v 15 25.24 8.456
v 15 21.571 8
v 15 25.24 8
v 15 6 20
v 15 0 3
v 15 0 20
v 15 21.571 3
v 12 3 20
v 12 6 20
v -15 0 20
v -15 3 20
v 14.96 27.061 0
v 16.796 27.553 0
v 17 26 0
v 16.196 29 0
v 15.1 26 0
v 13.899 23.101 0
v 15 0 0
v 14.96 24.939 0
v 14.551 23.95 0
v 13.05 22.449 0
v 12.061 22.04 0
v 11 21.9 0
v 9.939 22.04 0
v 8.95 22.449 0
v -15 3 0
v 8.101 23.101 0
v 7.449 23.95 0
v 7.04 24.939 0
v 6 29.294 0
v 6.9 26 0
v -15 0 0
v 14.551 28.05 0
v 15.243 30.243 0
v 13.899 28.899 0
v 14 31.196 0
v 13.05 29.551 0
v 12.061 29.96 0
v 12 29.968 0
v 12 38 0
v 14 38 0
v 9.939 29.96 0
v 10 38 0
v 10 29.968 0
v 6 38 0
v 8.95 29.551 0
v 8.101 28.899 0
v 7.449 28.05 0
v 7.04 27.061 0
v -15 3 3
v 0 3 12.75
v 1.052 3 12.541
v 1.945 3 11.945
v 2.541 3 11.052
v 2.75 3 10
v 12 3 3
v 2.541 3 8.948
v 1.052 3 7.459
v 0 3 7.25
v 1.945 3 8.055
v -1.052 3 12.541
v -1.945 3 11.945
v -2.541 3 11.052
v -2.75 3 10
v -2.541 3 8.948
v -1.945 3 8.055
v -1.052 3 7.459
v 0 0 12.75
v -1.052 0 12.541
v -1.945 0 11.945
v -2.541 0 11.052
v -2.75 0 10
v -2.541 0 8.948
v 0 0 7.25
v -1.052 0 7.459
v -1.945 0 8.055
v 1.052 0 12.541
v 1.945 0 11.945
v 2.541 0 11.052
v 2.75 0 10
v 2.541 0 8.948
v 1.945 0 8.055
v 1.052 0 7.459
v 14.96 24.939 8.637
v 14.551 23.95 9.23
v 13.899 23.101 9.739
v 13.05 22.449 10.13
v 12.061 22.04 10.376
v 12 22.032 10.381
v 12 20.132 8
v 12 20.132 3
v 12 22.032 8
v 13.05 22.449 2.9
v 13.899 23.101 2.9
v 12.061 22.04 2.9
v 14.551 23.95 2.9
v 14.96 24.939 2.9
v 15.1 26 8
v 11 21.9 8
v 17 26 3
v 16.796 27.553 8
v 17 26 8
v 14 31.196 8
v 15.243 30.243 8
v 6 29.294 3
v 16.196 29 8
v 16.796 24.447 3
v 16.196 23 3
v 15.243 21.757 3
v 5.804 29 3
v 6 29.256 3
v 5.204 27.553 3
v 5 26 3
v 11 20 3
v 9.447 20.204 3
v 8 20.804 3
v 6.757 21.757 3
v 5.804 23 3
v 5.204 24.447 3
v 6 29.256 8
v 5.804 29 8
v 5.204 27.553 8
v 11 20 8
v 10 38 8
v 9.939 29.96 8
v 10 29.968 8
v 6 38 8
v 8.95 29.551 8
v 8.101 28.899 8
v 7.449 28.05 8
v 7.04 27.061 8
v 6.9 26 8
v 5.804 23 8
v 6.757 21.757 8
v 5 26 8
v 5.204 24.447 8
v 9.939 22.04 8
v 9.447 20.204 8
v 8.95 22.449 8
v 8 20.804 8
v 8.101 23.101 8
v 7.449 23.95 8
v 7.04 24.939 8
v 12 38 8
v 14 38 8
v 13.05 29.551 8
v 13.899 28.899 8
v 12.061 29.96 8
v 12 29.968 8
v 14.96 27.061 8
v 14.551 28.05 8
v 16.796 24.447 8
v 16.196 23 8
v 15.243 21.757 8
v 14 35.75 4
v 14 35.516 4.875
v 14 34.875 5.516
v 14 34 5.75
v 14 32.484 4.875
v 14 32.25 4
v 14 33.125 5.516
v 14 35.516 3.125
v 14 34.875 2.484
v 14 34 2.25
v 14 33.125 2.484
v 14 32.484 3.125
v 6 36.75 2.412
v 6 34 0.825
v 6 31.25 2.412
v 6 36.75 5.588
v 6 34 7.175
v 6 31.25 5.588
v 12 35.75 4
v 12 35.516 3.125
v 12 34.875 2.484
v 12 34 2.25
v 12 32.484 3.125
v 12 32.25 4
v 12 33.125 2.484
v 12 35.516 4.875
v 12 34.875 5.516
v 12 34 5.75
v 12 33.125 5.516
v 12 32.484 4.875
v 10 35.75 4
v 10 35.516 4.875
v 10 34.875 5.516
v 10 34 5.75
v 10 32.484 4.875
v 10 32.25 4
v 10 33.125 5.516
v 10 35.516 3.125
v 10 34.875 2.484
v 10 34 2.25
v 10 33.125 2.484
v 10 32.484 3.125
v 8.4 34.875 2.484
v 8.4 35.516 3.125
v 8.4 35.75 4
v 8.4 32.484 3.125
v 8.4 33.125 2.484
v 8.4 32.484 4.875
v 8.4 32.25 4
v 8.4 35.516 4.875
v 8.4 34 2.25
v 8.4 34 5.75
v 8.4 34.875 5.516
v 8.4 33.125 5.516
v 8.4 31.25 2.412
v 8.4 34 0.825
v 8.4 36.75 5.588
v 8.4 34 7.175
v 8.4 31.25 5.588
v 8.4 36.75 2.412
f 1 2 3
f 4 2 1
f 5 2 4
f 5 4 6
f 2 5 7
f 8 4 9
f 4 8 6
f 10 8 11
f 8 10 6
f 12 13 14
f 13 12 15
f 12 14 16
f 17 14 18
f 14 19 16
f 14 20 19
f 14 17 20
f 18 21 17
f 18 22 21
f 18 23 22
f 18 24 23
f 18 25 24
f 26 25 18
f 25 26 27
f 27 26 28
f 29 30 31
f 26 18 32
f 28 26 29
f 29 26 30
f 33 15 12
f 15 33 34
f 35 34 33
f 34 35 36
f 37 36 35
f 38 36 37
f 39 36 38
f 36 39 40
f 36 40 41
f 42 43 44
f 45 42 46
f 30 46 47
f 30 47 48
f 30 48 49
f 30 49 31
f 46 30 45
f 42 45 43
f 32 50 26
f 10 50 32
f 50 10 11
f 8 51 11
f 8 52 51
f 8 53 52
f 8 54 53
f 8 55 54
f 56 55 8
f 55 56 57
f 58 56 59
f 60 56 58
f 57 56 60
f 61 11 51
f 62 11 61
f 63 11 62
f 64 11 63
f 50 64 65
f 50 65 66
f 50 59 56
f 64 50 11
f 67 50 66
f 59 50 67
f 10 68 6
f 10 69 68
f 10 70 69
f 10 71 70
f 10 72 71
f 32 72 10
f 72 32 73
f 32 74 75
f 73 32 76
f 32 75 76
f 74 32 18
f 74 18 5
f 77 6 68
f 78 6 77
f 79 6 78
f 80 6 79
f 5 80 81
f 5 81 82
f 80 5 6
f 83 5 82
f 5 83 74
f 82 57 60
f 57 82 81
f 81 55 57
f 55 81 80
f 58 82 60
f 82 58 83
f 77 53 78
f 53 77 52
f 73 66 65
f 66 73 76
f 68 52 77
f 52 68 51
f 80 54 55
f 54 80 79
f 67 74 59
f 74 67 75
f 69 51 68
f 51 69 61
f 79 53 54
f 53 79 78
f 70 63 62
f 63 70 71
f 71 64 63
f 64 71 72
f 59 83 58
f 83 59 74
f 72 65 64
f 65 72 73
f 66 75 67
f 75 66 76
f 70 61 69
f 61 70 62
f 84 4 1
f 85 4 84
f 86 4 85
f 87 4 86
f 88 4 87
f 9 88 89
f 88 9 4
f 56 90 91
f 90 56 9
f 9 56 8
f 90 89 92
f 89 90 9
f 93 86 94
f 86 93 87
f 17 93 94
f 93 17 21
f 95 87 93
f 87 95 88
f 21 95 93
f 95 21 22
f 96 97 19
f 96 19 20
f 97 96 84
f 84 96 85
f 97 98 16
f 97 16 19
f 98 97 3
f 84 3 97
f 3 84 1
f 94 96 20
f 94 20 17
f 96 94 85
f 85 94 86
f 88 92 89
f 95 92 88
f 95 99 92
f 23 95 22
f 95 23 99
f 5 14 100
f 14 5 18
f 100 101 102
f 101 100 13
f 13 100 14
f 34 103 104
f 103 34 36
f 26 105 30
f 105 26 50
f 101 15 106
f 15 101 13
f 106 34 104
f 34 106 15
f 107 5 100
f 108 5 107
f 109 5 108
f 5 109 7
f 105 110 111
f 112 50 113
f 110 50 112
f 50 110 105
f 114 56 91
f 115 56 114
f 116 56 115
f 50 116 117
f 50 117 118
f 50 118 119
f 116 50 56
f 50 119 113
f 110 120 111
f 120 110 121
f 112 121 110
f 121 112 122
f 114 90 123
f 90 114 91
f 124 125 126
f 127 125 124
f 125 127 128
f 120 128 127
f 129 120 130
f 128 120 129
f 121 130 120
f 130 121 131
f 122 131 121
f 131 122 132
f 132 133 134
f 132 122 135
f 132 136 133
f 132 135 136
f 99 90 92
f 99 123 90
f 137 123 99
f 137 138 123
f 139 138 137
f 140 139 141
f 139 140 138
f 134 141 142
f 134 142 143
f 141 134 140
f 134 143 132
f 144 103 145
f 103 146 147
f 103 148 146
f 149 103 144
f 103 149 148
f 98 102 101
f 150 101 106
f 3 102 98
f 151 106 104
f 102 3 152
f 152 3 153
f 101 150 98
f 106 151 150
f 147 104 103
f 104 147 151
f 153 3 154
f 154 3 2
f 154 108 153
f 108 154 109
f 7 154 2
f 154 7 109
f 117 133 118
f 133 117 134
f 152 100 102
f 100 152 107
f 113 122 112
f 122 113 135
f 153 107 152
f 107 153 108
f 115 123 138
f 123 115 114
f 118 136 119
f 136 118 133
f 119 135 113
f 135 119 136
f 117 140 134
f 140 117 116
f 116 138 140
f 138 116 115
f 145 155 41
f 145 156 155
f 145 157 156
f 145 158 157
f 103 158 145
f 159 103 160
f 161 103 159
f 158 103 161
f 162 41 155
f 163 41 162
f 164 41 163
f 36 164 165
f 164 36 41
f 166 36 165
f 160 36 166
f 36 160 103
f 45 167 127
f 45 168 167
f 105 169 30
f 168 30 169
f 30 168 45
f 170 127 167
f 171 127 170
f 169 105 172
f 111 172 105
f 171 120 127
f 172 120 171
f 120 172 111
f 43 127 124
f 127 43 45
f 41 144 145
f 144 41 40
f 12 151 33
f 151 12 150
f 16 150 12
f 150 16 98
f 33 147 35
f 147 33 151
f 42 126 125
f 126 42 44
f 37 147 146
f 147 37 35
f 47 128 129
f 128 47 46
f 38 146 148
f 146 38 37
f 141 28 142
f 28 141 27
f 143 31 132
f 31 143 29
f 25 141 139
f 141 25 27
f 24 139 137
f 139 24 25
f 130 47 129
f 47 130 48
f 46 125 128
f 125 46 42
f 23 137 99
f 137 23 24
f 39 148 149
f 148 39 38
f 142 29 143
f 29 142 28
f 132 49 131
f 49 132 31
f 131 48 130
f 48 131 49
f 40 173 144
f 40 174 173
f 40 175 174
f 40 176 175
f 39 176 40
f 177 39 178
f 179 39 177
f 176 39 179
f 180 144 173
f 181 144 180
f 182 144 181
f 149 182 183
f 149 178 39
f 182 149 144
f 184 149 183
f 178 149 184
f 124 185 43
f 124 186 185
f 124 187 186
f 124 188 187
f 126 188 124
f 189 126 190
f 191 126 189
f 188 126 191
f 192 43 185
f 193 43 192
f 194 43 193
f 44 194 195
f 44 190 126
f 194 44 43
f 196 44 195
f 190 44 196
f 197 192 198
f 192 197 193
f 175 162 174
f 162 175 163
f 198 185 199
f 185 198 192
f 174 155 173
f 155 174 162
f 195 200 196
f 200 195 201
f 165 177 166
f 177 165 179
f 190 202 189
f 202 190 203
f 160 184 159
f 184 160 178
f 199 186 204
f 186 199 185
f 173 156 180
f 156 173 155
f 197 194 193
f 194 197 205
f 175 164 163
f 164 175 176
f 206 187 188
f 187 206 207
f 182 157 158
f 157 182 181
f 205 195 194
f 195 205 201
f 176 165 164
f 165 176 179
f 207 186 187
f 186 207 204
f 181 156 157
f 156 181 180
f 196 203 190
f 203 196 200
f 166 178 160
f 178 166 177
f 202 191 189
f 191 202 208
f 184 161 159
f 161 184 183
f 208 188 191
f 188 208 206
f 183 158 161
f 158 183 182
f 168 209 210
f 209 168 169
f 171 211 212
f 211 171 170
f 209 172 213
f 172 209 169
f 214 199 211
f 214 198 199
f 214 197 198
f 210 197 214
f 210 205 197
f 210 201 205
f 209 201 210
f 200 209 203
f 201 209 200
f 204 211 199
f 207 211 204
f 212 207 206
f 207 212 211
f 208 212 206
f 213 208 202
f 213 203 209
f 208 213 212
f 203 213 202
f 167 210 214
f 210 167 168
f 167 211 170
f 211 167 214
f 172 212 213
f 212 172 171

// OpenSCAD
// file: modules.scad
// Fonctions personnalisées

//http://forum.openscad.org/Wish-mirror-copy-true-td10681.html
module copy_mirror(vec=[0,1,0])
{
    children();
    mirror(vec) children();
}

module ecrou(plat,h){
  cylinder(d=plat*2/sqrt(3), h=h, $fn=6);
}


module courroie(diam,longueur){
  color ("black")
  difference(){
    hull(){
      cylinder(d=diam+1, h=6, $fn=32);
      translate([longueur,0,0]) cylinder(d=diam+1, h=6, $fn=32);
    }
    translate([0,0,-1])
    hull(){
      cylinder(d=diam-1, h=8, $fn=32);
      translate([longueur,0,0]) cylinder(d=diam-1, h=8, $fn=32);
    }
  }
  
  
}
// file: config.scad
// Paramètres de la machine

decal=-30;            // décallage du chassis xz
hauteur=400;          // hauteur totale chassis
largeur=350;          // largeur totale chassis
longueur=500;         // longueur totale chassis
hauteur_base=90;      // hauteur de la base
entraxe_y=140;        // distance entre les tiges Ø8 axe Y

couleur=[1,0.6,0];



// Paramètre des pièces et jeux

// écart plateau/courroie
// y_belt_holder
belt_h=13;      // écart entre la courroie et le plateau

// écart plateau/tiges lisses
// y_lm8uu
decal_plateau=12; // Décallage en Y

// décallage des tiges lisses Y
// support_tige8_y
decal_tiges=5;

// décallage moteur Y
// y_motor
decal_motory_z=11;
decal_motory_y=25;

// Fixations axe Z
pos_z=26;
hauteur_z=20;
entraxe_z=17;

// Plats écrous
ec3=5.7;
ec4=7.2;
ec5=8.2;
ec6=10.2;

// Jeu sur plats pour les écrous glissants
jec=0.2;

// hauteur écrous
ec3h=2.4;
ec4h=3.2;
ec5h=4.7;
ec6h=5.2;

// Vis
vis3=3.5;
vis4=4.5;
vis5=5.5;
vis6=6.5;

// nombre de dents des poulies
poulie=20;
// main file
include <config.scad>;
use <modules.scad>;

module z_bar_l(){
  ep=3;
  
  color(couleur) translate([-42/2+30/2,pos_z,0]){
    // fixation face
    difference(){
      translate([-(30-42/2),-pos_z,0]) cube([30,ep,hauteur_z]);
      translate([42/2-30/2, -pos_z-1,hauteur_z/2]) rotate([-90,0,0]) cylinder(h=ep+2, d=vis5, $fn=16);
    }
    // fixation coté
    /*difference(){
      translate([42/2-30,-pos_z-30,0]) cube([ep,30,hauteur_z]);
      translate([42/2-30-1,-pos_z-30/2,hauteur_z/2]) rotate([0,90,0]) cylinder(d=vis5, h=ep+2, $fn=16);}*/
    // nervure
    translate([42/2-ep,0,0])
    difference(){
      hull(){
        translate([0,-1,0]) cube([ep,1,ep+5]);
        translate([0,-pos_z+ep,0]) cube([ep,ep,hauteur_z]);
      }
      translate([-1,-pos_z-1,-1.1]) cube([ep+2, 42/2+pos_z+2, ep+1]);
      // trou tige
      translate([-42/2+ep+entraxe_z,0,-1]) cylinder(d=8.2, h=hauteur_z+2, $fn=24);
    }
    // tige 8
    translate([entraxe_z,0,0]){
      difference(){
        union(){
          hull(){
            cylinder(d=8+2*2, h=ep, $fn=24);
            translate([-(30-42/2)-entraxe_z,-pos_z,0]) cube([30,ep,ep]);
          }
          cylinder(d=8+2*2, h=8, $fn=24);
          translate([-5,0,0]) cube([8,8/2+8,ep+5],convexity=15);
        }
        // trou tige
        translate([0,0,-1]) cylinder(d=8.2, h=8+2, $fn=24);
        // rainure
        translate([-1,-1,-1]) cube([2,8/2+8+2,ep+5+2]);
        // vis
        translate([-10,8,4]) rotate([0,90,0]) cylinder(h=20, d=vis3, $fn=12);
        translate([-5+-1,8,4]) rotate([0,90,0]) ecrou(5.5, ec3h+1);
      }
    }
  }
}

z_bar_l();
